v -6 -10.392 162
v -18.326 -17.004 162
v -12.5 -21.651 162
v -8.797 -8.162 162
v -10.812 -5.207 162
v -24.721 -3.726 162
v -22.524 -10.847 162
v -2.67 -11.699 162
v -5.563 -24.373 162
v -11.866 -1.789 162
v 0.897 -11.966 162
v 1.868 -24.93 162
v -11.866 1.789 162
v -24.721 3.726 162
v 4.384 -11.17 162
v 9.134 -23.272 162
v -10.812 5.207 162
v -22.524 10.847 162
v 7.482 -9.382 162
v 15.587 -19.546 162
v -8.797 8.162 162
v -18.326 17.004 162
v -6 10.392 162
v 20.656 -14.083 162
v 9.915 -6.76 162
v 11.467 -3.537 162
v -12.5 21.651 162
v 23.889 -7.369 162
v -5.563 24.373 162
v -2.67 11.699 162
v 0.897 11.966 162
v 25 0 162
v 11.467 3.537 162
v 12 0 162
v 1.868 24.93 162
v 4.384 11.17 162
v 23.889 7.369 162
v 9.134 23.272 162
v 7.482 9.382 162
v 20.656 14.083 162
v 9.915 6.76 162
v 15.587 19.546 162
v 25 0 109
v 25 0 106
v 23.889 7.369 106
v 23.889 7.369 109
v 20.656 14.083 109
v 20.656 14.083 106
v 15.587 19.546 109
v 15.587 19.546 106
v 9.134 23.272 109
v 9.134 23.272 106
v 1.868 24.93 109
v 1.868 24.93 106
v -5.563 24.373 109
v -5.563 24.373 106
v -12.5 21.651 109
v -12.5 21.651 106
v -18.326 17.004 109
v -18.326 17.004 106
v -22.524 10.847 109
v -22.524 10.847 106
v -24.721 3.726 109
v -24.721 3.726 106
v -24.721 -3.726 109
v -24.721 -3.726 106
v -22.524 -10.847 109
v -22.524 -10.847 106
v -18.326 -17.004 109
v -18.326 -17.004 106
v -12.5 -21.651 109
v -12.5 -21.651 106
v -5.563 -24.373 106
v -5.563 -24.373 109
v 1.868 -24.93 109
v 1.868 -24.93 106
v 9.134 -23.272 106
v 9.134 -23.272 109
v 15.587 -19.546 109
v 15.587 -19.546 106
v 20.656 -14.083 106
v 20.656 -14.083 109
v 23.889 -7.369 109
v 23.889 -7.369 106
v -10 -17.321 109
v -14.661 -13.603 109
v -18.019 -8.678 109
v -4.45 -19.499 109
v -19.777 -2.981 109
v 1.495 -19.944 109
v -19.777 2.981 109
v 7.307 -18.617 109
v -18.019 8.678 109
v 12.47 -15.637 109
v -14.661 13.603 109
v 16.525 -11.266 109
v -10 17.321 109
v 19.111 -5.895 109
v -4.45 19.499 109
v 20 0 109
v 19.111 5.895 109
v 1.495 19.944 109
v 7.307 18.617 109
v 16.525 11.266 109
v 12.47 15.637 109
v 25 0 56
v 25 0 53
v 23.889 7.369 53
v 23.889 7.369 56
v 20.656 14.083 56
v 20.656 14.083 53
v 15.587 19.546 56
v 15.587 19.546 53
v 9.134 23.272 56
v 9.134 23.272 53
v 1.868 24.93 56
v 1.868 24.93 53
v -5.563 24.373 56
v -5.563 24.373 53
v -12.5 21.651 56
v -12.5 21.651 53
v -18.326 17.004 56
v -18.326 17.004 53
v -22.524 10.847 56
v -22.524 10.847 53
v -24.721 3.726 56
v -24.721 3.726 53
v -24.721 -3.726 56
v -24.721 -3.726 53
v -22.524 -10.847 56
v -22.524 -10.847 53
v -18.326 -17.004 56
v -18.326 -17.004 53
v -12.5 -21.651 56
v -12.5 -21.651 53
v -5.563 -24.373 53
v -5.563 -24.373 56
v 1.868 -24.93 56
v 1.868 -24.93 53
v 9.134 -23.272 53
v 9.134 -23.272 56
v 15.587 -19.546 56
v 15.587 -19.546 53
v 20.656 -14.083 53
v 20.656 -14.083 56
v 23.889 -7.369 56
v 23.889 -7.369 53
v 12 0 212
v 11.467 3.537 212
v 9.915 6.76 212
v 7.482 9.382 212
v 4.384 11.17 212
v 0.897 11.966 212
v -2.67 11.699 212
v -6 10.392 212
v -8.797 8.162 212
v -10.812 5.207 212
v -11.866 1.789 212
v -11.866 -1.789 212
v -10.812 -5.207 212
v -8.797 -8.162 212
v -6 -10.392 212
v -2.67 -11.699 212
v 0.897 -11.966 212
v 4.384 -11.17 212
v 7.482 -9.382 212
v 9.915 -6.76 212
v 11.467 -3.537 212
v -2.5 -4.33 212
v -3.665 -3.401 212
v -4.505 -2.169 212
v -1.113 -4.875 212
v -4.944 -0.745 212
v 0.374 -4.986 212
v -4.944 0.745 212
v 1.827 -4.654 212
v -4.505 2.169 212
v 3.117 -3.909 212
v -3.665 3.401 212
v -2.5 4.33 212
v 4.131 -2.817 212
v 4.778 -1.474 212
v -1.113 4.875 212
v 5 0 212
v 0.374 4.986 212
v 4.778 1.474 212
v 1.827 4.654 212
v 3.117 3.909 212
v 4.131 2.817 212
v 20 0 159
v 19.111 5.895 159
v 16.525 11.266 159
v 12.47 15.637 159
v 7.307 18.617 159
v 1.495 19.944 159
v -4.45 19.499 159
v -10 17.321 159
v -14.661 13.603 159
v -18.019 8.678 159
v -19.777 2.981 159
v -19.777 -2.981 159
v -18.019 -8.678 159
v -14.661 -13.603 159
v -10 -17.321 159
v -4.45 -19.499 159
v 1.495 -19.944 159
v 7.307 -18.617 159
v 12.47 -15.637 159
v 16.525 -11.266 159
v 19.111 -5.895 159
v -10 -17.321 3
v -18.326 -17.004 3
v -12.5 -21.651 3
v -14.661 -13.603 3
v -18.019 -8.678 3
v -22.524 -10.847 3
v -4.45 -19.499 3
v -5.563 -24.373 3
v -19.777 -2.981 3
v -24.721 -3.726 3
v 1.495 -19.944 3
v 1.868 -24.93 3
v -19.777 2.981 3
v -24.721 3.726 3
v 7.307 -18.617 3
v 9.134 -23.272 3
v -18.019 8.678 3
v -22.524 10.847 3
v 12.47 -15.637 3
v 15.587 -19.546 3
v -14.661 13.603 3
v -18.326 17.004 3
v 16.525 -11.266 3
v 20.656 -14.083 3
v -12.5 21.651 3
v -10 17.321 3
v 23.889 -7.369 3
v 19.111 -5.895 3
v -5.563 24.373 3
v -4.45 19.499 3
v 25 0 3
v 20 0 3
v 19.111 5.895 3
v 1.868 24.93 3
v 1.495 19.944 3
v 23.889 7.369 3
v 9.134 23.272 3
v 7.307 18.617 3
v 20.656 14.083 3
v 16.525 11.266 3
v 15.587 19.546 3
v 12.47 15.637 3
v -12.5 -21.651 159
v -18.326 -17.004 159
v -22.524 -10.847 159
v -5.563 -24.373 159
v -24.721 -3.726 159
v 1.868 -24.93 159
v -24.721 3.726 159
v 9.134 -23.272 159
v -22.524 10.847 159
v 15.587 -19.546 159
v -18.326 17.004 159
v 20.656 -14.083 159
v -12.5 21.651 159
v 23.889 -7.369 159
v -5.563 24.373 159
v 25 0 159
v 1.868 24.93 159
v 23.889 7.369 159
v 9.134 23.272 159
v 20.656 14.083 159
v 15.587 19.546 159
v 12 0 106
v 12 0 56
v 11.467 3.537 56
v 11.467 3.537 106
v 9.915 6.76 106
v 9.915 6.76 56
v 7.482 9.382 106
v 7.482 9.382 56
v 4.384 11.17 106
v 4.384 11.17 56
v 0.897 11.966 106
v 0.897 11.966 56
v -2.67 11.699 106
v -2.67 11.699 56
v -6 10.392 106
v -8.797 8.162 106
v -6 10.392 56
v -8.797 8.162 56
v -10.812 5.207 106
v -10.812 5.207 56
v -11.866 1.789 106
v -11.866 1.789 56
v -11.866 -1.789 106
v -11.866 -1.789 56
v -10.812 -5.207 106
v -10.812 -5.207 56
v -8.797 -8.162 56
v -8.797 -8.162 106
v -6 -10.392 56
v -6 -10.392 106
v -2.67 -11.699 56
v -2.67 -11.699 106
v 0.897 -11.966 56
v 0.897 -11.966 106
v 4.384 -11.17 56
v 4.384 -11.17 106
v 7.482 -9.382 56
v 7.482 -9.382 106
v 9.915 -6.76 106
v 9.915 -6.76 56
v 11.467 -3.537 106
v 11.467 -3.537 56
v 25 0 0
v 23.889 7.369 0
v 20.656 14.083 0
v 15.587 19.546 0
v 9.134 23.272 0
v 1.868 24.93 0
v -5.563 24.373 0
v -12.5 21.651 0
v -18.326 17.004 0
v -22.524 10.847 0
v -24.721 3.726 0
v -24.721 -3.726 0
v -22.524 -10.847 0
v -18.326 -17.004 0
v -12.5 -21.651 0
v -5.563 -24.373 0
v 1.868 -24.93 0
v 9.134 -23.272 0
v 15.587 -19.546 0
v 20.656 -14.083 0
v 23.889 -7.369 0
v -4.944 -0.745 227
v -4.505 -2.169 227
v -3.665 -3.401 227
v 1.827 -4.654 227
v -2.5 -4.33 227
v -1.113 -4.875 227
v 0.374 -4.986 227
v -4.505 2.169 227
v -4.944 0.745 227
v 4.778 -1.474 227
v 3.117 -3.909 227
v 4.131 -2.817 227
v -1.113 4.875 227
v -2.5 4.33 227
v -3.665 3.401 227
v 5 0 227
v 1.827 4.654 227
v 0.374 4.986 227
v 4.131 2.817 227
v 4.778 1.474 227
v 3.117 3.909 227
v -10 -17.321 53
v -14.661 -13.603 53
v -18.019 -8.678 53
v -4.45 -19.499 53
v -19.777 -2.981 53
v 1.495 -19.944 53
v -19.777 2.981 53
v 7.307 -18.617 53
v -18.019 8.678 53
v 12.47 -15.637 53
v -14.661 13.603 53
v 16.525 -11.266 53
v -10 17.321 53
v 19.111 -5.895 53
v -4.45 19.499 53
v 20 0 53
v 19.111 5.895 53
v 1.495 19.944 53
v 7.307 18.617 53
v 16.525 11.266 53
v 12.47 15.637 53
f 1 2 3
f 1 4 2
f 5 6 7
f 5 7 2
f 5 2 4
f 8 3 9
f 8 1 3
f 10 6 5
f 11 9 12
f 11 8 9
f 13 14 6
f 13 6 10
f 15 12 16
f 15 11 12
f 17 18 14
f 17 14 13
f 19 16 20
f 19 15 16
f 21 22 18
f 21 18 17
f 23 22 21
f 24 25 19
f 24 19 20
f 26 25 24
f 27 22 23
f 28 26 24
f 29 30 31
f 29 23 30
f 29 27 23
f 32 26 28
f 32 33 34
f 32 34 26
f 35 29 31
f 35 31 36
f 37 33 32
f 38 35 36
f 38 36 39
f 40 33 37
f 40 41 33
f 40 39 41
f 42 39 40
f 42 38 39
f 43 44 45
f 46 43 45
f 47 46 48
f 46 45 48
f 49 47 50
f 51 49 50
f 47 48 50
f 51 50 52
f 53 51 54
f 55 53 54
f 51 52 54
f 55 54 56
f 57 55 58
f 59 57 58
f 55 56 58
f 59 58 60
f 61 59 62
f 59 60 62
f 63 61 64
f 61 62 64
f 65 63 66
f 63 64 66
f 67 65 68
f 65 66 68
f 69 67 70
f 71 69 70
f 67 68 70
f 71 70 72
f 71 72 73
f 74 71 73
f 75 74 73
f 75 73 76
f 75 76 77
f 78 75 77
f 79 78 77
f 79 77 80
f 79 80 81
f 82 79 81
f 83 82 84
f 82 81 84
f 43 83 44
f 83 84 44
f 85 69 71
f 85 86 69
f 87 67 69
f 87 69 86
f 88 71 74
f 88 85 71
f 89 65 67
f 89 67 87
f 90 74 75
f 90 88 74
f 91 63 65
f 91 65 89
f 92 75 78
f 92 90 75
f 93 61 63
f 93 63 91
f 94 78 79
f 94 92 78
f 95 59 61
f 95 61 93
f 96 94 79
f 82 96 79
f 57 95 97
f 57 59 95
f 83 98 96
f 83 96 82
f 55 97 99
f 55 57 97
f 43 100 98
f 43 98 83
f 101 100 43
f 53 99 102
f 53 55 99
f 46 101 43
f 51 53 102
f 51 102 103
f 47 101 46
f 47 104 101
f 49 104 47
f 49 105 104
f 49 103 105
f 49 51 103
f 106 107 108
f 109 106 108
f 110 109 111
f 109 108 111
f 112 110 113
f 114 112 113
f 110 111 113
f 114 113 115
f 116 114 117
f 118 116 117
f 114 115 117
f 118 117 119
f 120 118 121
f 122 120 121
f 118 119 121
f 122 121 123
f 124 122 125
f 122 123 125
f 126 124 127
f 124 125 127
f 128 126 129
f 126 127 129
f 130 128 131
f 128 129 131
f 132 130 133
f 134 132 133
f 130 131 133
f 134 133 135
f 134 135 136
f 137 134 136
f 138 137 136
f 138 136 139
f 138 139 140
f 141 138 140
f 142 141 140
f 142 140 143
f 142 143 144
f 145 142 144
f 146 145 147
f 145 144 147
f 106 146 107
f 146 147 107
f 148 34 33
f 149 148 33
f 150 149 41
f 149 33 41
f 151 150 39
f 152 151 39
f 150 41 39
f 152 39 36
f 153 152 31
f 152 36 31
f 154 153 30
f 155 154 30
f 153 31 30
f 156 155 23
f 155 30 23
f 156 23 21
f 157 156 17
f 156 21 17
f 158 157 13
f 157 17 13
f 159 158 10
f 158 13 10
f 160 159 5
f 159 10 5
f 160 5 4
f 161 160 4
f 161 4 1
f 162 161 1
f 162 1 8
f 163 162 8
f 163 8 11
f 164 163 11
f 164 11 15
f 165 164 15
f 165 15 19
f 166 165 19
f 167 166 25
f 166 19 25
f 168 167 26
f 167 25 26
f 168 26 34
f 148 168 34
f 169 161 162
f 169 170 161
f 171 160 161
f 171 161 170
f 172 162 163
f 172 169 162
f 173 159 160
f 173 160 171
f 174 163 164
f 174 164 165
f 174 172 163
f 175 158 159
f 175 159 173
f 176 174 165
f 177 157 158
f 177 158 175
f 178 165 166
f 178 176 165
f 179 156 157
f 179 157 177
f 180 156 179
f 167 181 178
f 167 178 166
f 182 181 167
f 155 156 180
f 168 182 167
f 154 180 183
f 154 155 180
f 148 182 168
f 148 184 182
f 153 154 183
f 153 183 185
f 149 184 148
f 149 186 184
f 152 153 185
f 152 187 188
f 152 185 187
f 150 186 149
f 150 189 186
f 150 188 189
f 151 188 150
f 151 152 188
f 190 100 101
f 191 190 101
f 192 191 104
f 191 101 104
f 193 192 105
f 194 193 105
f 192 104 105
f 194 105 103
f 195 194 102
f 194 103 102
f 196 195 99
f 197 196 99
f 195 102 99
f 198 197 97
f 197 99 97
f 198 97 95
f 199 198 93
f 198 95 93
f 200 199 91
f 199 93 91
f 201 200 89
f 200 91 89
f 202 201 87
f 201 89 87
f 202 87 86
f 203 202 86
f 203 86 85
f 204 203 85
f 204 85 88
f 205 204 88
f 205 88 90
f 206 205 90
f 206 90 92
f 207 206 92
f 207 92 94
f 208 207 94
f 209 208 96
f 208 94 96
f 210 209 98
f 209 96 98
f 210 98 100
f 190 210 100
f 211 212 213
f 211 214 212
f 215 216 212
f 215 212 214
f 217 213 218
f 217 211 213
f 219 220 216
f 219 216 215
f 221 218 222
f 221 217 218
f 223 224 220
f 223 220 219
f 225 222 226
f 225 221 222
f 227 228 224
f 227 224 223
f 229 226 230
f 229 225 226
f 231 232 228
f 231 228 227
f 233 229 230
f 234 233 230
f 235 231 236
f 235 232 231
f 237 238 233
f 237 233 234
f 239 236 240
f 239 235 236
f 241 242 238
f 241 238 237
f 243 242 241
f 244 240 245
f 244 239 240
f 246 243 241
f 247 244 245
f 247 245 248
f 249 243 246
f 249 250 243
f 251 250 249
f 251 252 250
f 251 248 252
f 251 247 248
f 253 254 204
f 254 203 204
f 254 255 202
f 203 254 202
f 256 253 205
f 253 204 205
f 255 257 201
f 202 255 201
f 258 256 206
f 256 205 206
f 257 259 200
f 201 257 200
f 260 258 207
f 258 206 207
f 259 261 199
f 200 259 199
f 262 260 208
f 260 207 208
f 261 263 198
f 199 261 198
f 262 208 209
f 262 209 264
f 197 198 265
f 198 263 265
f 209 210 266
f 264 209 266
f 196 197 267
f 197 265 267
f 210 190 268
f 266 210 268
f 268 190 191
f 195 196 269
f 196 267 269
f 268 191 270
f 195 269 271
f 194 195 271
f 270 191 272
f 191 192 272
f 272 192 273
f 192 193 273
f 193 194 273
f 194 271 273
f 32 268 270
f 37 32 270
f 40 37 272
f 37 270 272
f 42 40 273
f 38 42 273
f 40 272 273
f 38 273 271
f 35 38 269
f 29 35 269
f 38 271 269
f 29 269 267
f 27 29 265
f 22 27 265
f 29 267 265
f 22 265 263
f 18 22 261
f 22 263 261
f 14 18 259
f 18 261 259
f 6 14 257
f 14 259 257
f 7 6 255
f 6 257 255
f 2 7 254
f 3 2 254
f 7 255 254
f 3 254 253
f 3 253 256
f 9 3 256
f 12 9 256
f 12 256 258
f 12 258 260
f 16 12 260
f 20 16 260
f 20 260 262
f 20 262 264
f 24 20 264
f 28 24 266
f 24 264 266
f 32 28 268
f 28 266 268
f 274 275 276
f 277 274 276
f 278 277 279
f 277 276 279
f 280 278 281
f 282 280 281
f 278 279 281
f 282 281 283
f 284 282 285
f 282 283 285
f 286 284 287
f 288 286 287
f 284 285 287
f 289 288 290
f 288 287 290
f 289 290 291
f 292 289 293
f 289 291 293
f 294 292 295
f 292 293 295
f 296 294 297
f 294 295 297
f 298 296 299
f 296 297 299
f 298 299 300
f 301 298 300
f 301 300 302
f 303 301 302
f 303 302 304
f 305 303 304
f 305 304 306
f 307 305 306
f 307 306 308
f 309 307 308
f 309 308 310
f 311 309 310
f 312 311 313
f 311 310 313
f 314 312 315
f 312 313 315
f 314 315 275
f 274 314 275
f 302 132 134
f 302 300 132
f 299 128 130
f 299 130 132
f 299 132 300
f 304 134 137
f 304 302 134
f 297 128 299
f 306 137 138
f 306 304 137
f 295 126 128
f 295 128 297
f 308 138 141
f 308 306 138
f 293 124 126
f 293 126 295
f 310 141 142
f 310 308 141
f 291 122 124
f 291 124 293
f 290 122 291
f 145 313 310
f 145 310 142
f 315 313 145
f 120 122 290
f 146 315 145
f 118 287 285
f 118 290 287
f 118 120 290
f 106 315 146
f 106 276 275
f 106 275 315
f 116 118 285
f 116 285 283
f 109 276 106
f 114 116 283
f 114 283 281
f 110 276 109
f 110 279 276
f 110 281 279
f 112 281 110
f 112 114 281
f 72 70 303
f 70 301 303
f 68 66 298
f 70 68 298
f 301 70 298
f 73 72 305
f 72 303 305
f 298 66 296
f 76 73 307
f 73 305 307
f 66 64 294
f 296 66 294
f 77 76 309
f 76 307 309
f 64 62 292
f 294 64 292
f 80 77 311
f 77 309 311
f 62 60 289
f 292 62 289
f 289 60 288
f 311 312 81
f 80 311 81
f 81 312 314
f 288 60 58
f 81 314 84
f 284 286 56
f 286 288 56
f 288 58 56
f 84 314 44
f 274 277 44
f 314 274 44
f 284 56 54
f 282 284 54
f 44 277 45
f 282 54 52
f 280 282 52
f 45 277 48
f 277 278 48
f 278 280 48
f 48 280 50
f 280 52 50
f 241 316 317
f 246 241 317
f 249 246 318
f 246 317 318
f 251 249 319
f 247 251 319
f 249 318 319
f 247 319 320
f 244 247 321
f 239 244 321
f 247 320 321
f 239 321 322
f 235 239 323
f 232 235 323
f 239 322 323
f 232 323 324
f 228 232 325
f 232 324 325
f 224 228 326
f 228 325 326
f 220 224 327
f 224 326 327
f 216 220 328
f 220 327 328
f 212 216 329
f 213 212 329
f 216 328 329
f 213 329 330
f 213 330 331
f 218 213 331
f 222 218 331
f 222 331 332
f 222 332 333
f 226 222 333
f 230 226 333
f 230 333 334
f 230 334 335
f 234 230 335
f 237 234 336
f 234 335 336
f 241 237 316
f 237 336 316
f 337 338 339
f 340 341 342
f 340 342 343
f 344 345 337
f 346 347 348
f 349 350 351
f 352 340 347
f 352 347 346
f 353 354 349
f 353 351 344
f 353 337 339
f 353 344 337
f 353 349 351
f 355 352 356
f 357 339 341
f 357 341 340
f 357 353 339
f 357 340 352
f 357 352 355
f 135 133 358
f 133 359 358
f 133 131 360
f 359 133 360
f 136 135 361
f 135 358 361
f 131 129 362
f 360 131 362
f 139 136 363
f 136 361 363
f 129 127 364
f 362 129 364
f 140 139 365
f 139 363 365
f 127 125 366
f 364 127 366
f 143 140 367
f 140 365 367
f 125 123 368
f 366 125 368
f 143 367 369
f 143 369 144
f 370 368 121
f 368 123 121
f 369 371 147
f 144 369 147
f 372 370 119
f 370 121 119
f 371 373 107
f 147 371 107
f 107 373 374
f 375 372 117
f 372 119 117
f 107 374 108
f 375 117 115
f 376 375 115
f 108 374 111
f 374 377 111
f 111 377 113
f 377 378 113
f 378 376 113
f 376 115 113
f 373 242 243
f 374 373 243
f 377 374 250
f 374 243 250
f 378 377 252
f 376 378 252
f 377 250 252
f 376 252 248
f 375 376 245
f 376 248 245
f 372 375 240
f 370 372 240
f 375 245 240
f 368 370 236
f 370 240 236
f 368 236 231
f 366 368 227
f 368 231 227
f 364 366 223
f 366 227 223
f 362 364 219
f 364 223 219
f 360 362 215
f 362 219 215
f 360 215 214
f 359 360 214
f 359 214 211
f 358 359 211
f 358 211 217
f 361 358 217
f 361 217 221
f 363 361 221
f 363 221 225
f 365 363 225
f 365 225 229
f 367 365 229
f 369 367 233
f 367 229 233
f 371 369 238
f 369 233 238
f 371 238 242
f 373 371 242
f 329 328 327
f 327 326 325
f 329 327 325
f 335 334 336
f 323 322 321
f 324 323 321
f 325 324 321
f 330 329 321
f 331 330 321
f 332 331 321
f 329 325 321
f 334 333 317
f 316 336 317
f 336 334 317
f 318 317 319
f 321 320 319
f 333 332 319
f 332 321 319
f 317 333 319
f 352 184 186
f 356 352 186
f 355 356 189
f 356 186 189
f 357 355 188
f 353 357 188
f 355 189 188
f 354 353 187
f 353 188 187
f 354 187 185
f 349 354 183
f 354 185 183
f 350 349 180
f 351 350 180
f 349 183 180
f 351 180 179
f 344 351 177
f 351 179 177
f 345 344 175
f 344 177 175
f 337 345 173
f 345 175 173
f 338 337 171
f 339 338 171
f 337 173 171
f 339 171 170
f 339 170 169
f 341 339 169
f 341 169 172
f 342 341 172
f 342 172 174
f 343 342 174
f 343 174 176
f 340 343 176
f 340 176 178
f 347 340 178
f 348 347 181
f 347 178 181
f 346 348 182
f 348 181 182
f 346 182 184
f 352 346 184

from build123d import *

# Parameters (mm, degrees)
SKETCH_1_R      = 25
EXTRUDE_1_DEPTH = 3
SKETCH_2_R      = 20
EXTRUDE_2_DEPTH = 50
SKETCH_3_R      = 25
EXTRUDE_3_DEPTH = 3
SKETCH_4_R      = 12
EXTRUDE_4_DEPTH = 50
SKETCH_5_R      = 25
EXTRUDE_5_DEPTH = 3
SKETCH_6_R      = 20
EXTRUDE_6_DEPTH = 50
SKETCH_8_R      = 25
EXTRUDE_7_DEPTH = 3
SKETCH_9_R      = 12
EXTRUDE_8_DEPTH = 50
SKETCH_10_R     = 5
EXTRUDE_9_DEPTH = 15


with BuildPart() as part:
    # 草图1 → 凸台-拉伸1 (new body)
    with BuildSketch(Plane.XY):
        Circle(SKETCH_1_R)
    extrude(amount=EXTRUDE_1_DEPTH)

    # 草图2 → 凸台-拉伸2 (add)
    with BuildSketch(Plane.XY.offset(3)):
        Circle(SKETCH_2_R)
    extrude(amount=EXTRUDE_2_DEPTH)

    # 草图3 → 凸台-拉伸3 (add)
    with BuildSketch(Plane.XY.offset(53)):
        Circle(SKETCH_3_R)
    extrude(amount=EXTRUDE_3_DEPTH)

    # 草图4 → 凸台-拉伸4 (add)
    with BuildSketch(Plane.XY.offset(56)):
        Circle(SKETCH_4_R)
    extrude(amount=EXTRUDE_4_DEPTH)

    # 草图5 → 凸台-拉伸5 (add)
    with BuildSketch(Plane.XY.offset(106)):
        Circle(SKETCH_5_R)
    extrude(amount=EXTRUDE_5_DEPTH)

    # 草图6 → 凸台-拉伸6 (add)
    with BuildSketch(Plane.XY.offset(109)):
        Circle(SKETCH_6_R)
    extrude(amount=EXTRUDE_6_DEPTH)

    # 草图8 → 凸台-拉伸7 (add)
    with BuildSketch(Plane.XY.offset(159)):
        Circle(SKETCH_8_R)
    extrude(amount=EXTRUDE_7_DEPTH)

    # 草图9 → 凸台-拉伸8 (add)
    with BuildSketch(Plane.XY.offset(162)):
        Circle(SKETCH_9_R)
    extrude(amount=EXTRUDE_8_DEPTH)

    # 草图10 → 凸台-拉伸9 (add)
    with BuildSketch(Plane.XY.offset(212)):
        Circle(SKETCH_10_R)
    extrude(amount=EXTRUDE_9_DEPTH)


solid = part.part
